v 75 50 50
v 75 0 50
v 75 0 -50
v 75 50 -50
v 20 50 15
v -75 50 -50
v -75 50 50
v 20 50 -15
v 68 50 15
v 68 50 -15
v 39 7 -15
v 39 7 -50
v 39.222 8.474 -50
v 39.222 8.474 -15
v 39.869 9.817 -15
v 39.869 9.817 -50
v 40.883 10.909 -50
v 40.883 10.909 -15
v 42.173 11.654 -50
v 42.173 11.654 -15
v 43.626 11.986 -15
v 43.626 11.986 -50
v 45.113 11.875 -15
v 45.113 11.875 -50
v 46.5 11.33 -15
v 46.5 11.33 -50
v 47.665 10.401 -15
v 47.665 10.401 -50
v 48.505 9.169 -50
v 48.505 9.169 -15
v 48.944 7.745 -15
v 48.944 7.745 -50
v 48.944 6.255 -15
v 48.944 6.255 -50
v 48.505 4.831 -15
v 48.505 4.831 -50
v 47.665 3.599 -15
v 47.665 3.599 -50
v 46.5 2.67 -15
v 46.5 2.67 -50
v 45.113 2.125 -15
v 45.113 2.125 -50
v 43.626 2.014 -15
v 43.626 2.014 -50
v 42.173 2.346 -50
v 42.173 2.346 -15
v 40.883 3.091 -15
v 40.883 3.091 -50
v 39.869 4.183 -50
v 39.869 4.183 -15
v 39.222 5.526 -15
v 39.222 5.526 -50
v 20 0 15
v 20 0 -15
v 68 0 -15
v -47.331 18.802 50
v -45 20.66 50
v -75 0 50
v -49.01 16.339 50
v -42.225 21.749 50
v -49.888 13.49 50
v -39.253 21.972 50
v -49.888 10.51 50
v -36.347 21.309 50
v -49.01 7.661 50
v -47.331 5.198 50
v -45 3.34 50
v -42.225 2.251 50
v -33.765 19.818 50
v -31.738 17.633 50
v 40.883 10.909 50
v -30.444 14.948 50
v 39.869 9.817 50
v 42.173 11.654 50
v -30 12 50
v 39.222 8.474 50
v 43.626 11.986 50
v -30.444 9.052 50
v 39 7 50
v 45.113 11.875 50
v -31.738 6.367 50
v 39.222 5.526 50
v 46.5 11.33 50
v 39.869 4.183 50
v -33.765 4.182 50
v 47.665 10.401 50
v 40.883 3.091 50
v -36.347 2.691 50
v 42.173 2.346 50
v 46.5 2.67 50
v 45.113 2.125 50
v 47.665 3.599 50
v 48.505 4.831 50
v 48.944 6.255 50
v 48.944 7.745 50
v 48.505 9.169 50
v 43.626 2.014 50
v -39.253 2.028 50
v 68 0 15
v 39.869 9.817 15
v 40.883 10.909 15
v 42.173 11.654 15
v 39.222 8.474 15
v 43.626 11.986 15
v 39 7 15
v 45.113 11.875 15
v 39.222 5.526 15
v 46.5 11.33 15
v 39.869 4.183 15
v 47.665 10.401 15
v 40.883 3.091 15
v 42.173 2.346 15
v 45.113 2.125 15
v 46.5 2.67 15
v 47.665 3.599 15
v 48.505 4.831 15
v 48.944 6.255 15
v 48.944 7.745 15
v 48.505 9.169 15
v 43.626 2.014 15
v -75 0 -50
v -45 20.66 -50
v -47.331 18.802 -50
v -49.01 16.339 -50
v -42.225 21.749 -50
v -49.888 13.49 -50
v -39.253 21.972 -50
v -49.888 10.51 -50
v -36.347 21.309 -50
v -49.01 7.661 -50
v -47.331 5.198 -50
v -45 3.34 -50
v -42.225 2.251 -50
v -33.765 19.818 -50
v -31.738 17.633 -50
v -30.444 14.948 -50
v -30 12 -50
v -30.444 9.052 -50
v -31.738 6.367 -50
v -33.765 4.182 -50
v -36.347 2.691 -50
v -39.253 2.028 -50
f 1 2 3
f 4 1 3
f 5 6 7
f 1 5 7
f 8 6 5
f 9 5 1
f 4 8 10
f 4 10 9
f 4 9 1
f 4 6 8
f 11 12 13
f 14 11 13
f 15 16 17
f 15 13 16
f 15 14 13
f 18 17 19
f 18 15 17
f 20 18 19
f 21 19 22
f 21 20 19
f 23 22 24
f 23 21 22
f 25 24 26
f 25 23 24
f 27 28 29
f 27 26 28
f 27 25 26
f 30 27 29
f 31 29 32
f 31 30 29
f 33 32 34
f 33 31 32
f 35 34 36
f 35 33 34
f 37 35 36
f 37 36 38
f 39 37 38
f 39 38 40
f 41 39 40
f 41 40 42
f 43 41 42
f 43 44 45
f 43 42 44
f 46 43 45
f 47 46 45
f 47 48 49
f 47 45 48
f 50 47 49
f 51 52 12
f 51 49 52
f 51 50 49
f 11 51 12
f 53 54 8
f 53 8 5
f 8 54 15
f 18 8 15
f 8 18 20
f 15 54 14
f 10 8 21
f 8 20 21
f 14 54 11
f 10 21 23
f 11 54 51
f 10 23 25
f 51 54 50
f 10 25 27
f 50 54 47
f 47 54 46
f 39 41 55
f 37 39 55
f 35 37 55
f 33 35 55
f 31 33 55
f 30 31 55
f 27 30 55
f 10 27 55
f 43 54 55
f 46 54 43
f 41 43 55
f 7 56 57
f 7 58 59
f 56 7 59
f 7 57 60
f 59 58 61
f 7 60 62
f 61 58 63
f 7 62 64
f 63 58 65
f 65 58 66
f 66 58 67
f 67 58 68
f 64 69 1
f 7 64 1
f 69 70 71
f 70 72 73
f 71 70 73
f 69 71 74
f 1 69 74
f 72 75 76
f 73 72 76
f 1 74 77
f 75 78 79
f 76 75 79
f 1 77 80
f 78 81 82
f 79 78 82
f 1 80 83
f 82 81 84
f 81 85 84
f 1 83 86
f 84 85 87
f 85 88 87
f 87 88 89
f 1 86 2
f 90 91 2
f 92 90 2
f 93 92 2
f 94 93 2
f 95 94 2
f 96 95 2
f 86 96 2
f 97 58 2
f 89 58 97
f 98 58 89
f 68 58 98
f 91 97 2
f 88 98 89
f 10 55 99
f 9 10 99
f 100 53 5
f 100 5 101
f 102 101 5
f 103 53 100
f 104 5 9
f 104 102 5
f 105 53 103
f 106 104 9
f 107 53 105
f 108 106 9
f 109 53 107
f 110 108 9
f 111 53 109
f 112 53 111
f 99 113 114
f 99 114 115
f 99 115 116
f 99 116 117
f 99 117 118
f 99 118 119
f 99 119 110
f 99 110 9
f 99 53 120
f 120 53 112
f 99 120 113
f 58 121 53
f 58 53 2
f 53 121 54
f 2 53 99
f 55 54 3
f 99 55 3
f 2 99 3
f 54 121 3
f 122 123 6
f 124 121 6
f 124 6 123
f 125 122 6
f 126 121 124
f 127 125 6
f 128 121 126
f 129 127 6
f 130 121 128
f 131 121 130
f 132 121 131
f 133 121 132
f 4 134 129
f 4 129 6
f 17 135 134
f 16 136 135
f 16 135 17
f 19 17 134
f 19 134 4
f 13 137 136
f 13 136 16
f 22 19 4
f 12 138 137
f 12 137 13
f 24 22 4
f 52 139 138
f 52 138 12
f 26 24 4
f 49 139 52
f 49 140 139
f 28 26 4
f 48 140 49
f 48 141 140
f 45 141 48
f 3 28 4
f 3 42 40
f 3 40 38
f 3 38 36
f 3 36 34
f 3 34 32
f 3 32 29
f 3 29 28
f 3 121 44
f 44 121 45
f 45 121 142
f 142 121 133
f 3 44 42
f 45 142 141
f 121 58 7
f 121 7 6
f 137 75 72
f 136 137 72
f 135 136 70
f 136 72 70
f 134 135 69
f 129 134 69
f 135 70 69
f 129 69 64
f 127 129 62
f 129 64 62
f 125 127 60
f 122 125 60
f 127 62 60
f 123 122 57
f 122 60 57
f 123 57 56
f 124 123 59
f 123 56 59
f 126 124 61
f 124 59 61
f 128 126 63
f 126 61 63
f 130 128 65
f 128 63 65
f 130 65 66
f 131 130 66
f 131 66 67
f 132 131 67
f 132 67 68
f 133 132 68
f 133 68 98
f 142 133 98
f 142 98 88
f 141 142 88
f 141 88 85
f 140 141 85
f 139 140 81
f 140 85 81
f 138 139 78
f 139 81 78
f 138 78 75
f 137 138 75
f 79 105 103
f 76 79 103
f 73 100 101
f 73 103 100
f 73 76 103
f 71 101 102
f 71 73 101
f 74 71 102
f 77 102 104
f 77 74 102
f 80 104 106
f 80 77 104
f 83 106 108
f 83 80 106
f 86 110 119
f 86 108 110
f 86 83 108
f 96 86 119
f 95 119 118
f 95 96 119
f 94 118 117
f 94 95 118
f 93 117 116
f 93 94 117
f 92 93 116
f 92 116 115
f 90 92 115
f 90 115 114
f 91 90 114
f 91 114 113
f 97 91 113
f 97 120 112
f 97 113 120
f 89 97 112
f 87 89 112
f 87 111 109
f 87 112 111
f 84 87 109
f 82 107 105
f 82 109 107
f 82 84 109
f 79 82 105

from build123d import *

# Parameters (mm, degrees)
SKETCH1_W               = 150
SKETCH1_H               = 100
BOSS_EXTRUDE1_DEPTH     = 50
SKETCH3_R               = 10
CUT_EXTRUDE1_DEPTH      = 100
SKETCH4_W               = 48
SKETCH4_H               = 30
CUT_EXTRUDE2_DEPTH      = 100
CUT_EXTRUDE3_DEPTH      = 112.130553854
CUT_EXTRUDE3_DEPTH_BACK = 112.130553854
SKETCH5_R               = 5


with BuildPart() as part:
    # Sketch1 → Boss-Extrude1 (new body)
    with BuildSketch(Plane(origin=(0, 0, 0), x_dir=(1, 0, 0), z_dir=(0, 1, 0))):
        Rectangle(SKETCH1_W, SKETCH1_H)
    extrude(amount=BOSS_EXTRUDE1_DEPTH)

    # Sketch3 → Cut-Extrude1 (cut)
    with BuildSketch(Plane.XY.offset(50)):
        with Locations((-40, 12)):
            Circle(SKETCH3_R)
    extrude(amount=-CUT_EXTRUDE1_DEPTH, mode=Mode.SUBTRACT)

    # Sketch4 → Cut-Extrude2 (cut)
    with BuildSketch(Plane.XZ):
        with Locations((44, 0)):
            Rectangle(SKETCH4_W, SKETCH4_H)
    extrude(amount=-CUT_EXTRUDE2_DEPTH, mode=Mode.SUBTRACT)

    # Sketch5 → Cut-Extrude3 (cut, two sides: drawn at the far end of the back side and taken through both)
    with BuildSketch(Plane(origin=(0, 0, 15), x_dir=(-1, 0, 0), z_dir=(0, 0, -1)).offset(-CUT_EXTRUDE3_DEPTH_BACK)):
        with Locations((-44, 7)):
            Circle(SKETCH5_R)
    extrude(amount=CUT_EXTRUDE3_DEPTH + CUT_EXTRUDE3_DEPTH_BACK, mode=Mode.SUBTRACT)


solid = part.part
